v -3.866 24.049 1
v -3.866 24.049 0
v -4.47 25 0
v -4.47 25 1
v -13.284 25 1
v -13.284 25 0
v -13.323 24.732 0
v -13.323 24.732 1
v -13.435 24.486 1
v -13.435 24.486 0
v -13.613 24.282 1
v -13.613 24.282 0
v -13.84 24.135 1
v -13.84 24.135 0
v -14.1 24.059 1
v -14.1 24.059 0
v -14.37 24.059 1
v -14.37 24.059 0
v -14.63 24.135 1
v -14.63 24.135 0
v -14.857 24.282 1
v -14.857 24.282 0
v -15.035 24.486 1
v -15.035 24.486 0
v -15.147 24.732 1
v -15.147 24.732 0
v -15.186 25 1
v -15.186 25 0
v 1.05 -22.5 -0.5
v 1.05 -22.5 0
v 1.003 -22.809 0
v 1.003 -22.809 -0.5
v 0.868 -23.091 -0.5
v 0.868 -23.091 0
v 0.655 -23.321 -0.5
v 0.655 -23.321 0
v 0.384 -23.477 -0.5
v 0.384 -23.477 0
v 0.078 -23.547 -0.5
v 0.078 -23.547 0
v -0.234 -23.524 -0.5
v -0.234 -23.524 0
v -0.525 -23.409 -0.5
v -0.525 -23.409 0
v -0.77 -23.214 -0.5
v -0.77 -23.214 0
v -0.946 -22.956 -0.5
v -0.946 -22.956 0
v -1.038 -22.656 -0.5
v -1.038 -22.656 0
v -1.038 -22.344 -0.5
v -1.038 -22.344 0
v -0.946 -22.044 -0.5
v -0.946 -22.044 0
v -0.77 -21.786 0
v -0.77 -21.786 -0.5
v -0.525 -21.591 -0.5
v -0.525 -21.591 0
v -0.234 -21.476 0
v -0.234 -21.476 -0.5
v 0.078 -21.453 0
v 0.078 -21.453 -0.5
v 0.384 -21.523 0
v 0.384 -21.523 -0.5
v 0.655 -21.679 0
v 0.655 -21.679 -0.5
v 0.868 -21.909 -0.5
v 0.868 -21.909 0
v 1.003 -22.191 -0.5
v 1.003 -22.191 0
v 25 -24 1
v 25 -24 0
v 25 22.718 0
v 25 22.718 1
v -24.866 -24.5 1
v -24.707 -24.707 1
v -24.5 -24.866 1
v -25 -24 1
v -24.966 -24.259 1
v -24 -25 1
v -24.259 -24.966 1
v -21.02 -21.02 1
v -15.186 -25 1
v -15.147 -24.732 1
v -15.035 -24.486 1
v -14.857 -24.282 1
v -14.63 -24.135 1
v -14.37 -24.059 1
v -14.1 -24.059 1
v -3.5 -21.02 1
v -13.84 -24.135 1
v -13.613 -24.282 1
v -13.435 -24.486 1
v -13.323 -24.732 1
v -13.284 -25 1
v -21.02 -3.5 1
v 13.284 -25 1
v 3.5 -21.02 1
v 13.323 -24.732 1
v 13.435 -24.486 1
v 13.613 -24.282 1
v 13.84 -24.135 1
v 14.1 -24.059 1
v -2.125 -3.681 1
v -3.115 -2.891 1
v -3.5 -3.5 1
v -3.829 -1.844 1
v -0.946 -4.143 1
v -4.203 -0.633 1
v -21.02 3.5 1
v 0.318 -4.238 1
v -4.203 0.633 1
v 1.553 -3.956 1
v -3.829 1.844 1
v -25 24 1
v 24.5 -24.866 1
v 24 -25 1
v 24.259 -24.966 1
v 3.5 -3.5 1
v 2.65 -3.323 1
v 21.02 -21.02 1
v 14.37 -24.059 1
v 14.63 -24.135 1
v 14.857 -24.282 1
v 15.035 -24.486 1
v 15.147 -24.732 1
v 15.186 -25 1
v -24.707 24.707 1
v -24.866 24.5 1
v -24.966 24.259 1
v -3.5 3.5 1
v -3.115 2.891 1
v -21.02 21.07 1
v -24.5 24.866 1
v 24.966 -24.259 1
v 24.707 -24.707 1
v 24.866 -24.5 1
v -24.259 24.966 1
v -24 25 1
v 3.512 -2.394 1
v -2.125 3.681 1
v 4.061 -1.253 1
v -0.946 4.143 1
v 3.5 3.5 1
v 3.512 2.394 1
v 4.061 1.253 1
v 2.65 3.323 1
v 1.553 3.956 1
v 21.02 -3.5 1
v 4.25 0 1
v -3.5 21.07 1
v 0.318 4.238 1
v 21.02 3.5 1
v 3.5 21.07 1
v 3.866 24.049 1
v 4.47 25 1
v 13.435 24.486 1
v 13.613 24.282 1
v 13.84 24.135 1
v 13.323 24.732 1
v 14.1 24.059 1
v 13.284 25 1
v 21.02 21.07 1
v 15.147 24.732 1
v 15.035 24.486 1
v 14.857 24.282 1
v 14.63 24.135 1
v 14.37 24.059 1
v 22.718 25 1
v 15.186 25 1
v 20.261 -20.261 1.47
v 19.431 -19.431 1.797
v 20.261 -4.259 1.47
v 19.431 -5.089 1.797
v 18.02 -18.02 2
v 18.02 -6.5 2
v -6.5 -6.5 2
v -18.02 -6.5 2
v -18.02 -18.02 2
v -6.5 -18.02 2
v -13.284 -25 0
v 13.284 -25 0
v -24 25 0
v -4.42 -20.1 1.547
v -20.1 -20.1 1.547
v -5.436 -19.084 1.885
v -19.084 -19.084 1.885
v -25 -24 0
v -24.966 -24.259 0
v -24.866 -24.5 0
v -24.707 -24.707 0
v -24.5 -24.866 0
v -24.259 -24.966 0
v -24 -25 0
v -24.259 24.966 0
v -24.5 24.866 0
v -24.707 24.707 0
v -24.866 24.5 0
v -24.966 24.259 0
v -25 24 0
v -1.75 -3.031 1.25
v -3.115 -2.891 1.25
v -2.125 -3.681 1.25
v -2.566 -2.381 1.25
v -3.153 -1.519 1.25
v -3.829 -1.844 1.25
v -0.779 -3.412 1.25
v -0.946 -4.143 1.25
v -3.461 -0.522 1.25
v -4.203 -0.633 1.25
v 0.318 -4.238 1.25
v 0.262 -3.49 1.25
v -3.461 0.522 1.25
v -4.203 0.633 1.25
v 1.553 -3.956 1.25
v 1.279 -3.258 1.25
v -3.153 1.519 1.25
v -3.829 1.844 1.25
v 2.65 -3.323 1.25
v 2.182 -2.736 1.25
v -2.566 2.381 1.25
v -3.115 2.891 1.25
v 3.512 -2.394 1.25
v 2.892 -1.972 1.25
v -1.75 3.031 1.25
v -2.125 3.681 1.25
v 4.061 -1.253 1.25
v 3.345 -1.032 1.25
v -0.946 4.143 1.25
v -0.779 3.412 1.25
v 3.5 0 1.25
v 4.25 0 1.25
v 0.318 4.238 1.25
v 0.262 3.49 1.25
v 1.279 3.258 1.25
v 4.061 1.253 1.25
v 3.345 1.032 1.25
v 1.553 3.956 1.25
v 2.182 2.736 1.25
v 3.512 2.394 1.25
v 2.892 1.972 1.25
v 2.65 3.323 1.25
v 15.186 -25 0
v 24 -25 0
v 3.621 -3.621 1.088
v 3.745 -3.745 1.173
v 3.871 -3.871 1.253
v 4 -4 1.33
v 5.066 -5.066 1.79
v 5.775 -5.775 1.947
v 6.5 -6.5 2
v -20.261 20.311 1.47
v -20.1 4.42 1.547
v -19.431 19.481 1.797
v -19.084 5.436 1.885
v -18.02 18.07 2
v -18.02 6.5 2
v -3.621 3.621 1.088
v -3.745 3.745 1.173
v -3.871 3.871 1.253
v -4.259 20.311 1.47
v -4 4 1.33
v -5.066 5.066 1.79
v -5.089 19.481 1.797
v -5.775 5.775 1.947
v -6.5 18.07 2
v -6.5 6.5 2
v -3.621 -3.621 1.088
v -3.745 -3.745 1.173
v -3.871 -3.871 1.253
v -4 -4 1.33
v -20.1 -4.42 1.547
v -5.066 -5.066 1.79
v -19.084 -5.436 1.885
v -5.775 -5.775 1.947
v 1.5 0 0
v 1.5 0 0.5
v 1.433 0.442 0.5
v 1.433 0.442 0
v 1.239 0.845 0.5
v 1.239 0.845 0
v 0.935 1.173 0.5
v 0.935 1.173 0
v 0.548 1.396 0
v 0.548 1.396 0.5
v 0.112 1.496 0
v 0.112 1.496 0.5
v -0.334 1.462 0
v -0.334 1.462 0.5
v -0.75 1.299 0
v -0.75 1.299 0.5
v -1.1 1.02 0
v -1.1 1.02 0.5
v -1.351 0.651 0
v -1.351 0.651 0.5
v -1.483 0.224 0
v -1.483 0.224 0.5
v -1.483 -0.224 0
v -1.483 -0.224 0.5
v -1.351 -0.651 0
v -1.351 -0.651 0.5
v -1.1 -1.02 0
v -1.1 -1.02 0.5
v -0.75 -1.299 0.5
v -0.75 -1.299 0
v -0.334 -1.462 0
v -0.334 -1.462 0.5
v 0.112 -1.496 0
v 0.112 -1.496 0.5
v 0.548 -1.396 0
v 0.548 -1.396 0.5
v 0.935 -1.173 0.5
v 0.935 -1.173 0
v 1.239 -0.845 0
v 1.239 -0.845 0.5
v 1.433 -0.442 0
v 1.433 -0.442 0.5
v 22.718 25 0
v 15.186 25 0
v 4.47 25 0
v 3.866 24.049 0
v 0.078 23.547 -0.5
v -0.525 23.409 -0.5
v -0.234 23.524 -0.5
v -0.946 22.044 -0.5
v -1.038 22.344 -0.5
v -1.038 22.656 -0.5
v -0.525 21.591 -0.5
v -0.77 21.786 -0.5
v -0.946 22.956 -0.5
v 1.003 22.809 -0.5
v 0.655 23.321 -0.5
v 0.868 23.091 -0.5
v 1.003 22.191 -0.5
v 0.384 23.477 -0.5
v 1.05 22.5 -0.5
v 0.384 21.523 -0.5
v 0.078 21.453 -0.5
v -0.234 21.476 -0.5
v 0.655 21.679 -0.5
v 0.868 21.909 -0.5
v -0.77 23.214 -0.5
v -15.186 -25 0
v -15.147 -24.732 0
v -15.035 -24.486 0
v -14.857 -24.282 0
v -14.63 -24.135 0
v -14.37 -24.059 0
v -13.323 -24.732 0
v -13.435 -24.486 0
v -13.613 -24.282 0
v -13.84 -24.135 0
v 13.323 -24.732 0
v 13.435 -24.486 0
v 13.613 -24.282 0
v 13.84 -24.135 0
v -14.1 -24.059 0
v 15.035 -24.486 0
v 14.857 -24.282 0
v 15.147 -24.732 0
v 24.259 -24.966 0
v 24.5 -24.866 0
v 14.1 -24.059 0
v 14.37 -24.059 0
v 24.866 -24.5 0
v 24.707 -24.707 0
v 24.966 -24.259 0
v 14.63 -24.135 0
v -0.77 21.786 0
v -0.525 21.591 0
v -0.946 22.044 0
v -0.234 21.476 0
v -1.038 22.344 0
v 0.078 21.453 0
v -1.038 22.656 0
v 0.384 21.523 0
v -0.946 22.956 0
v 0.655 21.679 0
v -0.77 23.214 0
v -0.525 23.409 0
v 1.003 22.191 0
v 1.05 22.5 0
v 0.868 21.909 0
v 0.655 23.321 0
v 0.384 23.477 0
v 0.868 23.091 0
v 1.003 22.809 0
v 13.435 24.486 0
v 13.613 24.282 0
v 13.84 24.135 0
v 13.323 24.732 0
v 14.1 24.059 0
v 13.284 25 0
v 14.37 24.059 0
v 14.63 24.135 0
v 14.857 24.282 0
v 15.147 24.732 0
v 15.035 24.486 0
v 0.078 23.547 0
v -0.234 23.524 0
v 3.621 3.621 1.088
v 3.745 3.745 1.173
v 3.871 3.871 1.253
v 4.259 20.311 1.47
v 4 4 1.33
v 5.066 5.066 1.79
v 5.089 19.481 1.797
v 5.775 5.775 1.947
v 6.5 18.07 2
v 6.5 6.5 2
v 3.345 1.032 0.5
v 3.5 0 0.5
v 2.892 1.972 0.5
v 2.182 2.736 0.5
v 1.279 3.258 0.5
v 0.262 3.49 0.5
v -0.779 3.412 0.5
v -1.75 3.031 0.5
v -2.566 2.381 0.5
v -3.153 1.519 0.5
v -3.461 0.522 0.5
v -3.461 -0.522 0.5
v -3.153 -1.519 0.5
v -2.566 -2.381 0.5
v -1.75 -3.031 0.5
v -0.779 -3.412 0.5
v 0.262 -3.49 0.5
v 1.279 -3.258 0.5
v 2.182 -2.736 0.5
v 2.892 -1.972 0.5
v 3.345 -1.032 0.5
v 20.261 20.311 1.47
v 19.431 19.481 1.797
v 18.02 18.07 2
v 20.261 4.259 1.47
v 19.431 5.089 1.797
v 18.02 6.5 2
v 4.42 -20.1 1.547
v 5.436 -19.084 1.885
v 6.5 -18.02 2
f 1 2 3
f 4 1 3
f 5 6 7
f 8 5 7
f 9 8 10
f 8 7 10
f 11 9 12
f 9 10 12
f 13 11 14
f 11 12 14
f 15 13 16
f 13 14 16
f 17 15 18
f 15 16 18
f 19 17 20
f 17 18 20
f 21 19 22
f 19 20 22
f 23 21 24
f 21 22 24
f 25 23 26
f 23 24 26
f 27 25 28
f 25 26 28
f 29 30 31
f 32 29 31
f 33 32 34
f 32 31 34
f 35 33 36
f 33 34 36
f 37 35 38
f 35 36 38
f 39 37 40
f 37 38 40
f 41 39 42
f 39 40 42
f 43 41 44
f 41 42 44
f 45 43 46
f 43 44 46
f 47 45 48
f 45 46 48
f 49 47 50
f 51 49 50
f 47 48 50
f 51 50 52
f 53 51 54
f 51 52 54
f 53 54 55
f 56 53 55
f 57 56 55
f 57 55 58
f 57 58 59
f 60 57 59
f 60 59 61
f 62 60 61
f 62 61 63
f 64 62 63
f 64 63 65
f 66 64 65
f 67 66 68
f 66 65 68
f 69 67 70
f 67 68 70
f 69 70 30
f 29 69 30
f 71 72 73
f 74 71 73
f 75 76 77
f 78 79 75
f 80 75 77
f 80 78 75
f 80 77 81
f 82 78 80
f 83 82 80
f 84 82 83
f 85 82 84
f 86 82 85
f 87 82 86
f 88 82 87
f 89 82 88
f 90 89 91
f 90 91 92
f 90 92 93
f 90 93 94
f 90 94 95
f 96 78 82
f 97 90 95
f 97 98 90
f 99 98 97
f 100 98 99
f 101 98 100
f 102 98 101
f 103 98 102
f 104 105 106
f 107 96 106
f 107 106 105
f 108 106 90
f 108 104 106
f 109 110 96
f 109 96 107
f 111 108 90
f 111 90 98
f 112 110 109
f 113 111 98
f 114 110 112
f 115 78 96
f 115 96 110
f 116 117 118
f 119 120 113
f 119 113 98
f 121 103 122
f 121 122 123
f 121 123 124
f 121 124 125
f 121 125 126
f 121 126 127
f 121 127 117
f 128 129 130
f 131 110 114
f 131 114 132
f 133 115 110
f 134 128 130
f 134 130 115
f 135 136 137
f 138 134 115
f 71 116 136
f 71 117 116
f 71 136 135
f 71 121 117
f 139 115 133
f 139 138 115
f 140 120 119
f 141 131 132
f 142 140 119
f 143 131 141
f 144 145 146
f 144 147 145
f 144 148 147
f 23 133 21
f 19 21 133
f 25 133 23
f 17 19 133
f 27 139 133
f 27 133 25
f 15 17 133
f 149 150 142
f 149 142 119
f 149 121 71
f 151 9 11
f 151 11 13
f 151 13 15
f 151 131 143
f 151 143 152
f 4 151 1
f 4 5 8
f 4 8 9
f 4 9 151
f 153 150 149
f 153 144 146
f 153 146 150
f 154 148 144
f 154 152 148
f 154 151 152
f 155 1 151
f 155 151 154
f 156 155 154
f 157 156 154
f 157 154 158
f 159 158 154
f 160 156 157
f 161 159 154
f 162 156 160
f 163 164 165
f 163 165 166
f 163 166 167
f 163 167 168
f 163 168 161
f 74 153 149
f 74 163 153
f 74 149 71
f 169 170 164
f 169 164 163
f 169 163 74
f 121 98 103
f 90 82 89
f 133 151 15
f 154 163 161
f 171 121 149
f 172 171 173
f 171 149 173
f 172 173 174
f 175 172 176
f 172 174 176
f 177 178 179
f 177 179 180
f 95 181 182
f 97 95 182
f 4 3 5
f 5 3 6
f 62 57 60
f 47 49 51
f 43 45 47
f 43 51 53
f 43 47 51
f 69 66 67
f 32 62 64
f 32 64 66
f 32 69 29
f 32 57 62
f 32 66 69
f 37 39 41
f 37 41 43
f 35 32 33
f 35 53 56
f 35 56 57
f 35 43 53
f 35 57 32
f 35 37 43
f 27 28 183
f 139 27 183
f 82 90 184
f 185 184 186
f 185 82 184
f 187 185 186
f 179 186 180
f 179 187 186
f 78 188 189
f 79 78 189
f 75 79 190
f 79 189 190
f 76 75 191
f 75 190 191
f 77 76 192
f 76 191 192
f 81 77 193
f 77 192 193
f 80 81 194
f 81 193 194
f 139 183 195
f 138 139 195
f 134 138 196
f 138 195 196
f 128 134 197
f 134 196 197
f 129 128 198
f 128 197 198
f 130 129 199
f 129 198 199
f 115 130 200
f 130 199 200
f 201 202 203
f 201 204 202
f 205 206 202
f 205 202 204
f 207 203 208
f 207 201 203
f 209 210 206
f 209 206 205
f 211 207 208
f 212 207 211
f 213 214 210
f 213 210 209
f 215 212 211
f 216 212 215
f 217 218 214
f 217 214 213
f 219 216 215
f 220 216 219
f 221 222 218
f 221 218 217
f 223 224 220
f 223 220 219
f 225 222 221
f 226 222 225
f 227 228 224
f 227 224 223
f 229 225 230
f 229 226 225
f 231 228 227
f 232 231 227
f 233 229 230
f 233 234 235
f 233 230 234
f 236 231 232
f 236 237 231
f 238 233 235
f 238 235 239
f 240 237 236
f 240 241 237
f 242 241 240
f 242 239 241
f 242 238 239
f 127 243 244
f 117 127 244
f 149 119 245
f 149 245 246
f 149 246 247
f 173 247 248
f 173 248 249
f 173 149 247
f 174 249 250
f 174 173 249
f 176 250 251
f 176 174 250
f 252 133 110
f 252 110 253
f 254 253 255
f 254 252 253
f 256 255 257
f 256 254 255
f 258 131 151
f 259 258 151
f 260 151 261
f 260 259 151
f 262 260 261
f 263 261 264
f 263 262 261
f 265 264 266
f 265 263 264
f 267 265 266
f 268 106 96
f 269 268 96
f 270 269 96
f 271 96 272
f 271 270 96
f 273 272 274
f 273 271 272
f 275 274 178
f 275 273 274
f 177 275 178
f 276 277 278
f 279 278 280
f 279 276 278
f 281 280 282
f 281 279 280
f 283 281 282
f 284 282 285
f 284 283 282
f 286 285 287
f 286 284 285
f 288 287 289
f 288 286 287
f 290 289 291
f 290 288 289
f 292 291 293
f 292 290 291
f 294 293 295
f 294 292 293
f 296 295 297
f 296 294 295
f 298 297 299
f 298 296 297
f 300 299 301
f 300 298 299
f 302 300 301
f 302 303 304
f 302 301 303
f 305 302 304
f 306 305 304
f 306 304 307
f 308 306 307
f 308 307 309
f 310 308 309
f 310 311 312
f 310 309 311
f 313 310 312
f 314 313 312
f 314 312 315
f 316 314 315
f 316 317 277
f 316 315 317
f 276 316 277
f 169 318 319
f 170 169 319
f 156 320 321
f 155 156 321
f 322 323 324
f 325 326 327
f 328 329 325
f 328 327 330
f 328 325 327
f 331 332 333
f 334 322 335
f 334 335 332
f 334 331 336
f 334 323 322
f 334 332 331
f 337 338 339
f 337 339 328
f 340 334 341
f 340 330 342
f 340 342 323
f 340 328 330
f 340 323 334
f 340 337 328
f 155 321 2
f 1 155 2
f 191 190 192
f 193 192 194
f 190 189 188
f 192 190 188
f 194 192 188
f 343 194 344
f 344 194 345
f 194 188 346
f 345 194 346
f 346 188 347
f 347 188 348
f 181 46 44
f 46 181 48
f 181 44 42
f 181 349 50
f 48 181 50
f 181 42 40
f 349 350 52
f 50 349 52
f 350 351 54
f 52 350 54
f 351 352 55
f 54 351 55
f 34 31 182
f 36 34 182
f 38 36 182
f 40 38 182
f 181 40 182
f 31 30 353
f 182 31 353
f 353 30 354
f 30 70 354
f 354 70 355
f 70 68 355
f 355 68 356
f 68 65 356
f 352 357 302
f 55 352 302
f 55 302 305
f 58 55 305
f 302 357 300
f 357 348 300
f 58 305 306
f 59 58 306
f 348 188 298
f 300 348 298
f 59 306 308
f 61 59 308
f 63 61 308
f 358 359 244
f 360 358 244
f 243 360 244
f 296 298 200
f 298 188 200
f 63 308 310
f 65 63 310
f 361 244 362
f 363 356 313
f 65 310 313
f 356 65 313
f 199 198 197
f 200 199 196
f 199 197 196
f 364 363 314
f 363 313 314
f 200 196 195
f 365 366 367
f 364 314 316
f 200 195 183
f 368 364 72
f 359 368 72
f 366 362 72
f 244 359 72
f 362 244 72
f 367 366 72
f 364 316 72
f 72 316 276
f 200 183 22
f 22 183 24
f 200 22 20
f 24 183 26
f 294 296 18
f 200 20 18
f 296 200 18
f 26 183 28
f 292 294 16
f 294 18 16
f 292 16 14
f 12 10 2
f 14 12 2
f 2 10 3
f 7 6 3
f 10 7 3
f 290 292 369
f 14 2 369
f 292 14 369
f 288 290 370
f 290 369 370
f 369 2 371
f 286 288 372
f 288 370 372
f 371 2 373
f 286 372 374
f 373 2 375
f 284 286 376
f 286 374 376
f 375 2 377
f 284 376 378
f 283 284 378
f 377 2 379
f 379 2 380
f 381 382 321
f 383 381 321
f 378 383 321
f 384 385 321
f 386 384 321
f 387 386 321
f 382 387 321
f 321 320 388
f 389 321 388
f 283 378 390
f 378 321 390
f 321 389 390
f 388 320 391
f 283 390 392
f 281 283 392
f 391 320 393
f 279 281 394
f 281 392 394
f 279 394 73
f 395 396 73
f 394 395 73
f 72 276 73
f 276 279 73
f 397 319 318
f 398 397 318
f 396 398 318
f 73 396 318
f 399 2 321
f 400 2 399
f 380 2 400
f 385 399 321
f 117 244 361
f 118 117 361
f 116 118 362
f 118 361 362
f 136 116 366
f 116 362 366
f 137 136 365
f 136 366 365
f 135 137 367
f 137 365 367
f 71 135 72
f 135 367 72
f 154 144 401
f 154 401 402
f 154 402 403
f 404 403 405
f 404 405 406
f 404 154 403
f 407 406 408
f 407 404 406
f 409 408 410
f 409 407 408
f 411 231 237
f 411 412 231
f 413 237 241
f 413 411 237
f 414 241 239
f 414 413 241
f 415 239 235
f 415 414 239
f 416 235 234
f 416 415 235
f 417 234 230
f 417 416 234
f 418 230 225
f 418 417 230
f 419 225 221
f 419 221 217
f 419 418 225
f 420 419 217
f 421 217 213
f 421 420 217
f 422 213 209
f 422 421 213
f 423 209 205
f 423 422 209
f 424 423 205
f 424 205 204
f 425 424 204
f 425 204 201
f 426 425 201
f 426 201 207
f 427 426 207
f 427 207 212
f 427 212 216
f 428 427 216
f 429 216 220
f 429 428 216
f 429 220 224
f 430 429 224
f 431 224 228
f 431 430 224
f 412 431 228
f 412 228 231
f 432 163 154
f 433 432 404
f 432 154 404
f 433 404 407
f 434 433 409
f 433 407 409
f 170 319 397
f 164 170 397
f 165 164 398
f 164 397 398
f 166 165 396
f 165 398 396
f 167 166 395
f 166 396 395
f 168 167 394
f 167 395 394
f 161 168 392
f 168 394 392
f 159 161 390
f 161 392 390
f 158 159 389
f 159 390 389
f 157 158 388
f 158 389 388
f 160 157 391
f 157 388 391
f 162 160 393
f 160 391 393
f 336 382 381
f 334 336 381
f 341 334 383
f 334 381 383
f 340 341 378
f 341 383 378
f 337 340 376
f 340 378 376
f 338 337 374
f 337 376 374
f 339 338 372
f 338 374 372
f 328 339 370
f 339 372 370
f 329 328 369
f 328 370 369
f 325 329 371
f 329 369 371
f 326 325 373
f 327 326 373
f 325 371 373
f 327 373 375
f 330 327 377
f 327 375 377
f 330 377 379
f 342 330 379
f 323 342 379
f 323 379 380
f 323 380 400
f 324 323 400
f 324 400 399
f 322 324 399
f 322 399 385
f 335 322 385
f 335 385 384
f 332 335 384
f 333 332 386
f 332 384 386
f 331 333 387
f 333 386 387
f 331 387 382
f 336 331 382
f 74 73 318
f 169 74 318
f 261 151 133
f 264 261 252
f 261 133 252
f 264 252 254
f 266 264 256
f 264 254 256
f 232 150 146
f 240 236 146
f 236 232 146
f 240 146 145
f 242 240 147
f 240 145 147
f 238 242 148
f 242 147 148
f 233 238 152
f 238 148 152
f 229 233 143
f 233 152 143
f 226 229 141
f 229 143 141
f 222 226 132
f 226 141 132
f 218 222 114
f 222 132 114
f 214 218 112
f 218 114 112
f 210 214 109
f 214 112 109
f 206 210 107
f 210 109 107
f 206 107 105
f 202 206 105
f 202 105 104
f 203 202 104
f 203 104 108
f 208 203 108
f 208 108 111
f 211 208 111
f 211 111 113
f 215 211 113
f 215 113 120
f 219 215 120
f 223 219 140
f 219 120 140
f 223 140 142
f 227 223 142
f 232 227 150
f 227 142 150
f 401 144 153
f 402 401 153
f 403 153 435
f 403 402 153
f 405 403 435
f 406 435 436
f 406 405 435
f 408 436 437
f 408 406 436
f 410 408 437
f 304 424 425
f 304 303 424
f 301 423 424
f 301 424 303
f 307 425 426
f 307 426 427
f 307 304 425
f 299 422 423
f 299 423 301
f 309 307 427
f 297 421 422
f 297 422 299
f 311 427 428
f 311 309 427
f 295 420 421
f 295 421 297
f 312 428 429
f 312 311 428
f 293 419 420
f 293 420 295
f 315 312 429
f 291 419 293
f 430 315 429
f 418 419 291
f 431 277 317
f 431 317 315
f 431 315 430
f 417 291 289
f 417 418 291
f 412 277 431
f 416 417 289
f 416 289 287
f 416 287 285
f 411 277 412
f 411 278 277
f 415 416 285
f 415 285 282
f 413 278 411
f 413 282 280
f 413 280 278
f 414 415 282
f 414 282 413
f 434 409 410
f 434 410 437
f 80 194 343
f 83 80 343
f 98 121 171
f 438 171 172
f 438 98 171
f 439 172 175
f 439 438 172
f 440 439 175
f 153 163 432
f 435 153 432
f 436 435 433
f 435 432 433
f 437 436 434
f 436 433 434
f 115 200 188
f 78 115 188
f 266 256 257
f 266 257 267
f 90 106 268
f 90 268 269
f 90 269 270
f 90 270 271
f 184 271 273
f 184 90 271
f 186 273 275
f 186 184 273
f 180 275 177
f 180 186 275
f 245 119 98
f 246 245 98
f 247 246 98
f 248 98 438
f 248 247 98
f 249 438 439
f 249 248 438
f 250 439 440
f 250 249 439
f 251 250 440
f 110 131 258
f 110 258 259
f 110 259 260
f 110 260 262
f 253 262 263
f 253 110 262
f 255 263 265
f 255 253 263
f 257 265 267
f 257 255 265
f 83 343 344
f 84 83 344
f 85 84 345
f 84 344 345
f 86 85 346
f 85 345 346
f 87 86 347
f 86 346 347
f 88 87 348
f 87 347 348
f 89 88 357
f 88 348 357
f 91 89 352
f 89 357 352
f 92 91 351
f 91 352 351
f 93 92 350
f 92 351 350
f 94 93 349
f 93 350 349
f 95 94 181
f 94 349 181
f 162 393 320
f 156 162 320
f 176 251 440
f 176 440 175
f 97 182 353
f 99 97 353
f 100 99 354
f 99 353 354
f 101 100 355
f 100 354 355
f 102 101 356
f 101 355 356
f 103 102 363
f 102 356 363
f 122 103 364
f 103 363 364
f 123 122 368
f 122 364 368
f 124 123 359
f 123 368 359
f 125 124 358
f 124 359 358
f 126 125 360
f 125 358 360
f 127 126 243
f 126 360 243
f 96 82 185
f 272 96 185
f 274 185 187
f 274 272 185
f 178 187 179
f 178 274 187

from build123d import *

# Parameters (mm, degrees)
F0_W         = 17.52
F0_H         = 17.52
F0_H_2       = 17.57
F0_R         = 1.5
F1_DEPTH     = 1
F2_W         = 17.52
F2_H         = 17.57
F2_H_2       = 17.52
F3_DEPTH     = 1
F4_R         = 3.5
F5_DEPTH     = 0.5
F6_R         = 4.25
F6_R_2       = 3.5
F7_DEPTH     = 0.25
F8_T1_DEPTH  = 32.52
F8_T3_DEPTH  = 32.52
F8_T5_DEPTH  = 32.57
F8_T7_DEPTH  = 32.52
F8_T12_DEPTH = 32.52
F8_S13_R     = 4.25
F8_T14_DEPTH = 18
F8_T18_DEPTH = 32.52
F8_S19_R     = 4.25
F8_T20_DEPTH = 18
F8_T24_DEPTH = 32.52
F8_S25_R     = 4.25
F8_T26_DEPTH = 18
F8_T30_DEPTH = 32.57
F8_S31_R     = 4.25
F8_T32_DEPTH = 18
F8_T36_DEPTH = 32.57
F8_S37_R     = 4.25
F8_T38_DEPTH = 18
F8_T42_DEPTH = 32.52
F8_S43_R     = 4.25
F8_T44_DEPTH = 18
F8_T48_DEPTH = 32.52
F8_S49_R     = 4.25
F8_T50_DEPTH = 18
F8_T54_DEPTH = 32.52
F8_S55_R     = 4.25
F8_T56_DEPTH = 18
F9_R         = 1.05
F10_DEPTH    = 0.5


# Not quite as in the source:
# - a fillet or chamfer that OpenCascade refuses, or shapes differently, is made with other operations: its cross-section is extruded or revolved along the edge and cut away or added


with BuildPart() as f1:
    # F0 (on Top) → F1 (new body)
    with BuildSketch(Plane.XY):
        with BuildLine():
            ThreePointArc((-25, -24), (-24.7071067812, -24.7071067812), (-24, -25))
            Line((-24, -25), (-15.1855654437, -25))
            ThreePointArc((-15.1855654437, -25), (-14.2350281943, -24.0494627506), (-13.2844909448, -25))
            Line((-13.2844909448, -25), (13.2844909448, -25))
            ThreePointArc((13.2844909448, -25), (14.2350281943, -24.0494627506), (15.1855654437, -25))
            Line((15.1855654437, -25), (24, -25))
            ThreePointArc((24, -25), (24.7071067812, -24.7071067812), (25, -24))
            Line((25, -24), (25, 22.7180756629))
            Line((25, 22.7180756629), (22.7180756629, 25))
            Line((22.7180756629, 25), (15.1855654437, 25))
            ThreePointArc((15.1855654437, 25), (14.2350281943, 24.0494627506), (13.2844909448, 25))
            Line((13.2844909448, 25), (4.4700563885, 25))
            Line((4.4700563885, 25), (3.8659917191, 24.0494627506))
            Line((3.8659917191, 24.0494627506), (0, 24.0494627506))
            Line((0, 24.0494627506), (-3.8659917191, 24.0494627506))
            Line((-3.8659917191, 24.0494627506), (-4.4700563885, 25))
            Line((-4.4700563885, 25), (-13.2844909448, 25))
            ThreePointArc((-13.2844909448, 25), (-14.2350281943, 24.0494627506), (-15.1855654437, 25))
            Line((-15.1855654437, 25), (-24, 25))
            ThreePointArc((-24, 25), (-24.7071067812, 24.7071067812), (-25, 24))
            Line((-25, 24), (-25, -24))
        make_face()
        with Locations((-12.26, -12.26)):
            Rectangle(F0_W, F0_H, mode=Mode.SUBTRACT)
        with Locations((12.26, -12.26)):
            Rectangle(F0_W, F0_H, mode=Mode.SUBTRACT)
        with Locations((-12.26, 12.285)):
            Rectangle(F0_W, F0_H_2, mode=Mode.SUBTRACT)
        Circle(F0_R, mode=Mode.SUBTRACT)
        with Locations((12.26, 12.285)):
            Rectangle(F0_W, F0_H_2, mode=Mode.SUBTRACT)
    extrude(amount=F1_DEPTH)

    # F2 (on face) → F3 (join, symmetric)
    with BuildSketch(Plane.XY.offset(1)):
        with Locations((-12.26, 12.285)):
            Rectangle(F2_W, F2_H)
        with Locations((12.26, 12.285)):
            Rectangle(F2_W, F2_H)
        with Locations((12.26, -12.26)):
            Rectangle(F2_W, F2_H_2)
        with Locations((-12.26, -12.26)):
            Rectangle(F2_W, F2_H_2)
    extrude(amount=F3_DEPTH, both=True)

    # F4 (on face) → F5 (cut)
    with BuildSketch(Plane.XY.offset(1)):
        Circle(F4_R)
    extrude(amount=-F5_DEPTH, mode=Mode.SUBTRACT)

    # F6 (on face) → F7 (join)
    with BuildSketch(Plane.XY.offset(1)):
        Circle(F6_R)
        Circle(F6_R_2, mode=Mode.SUBTRACT)
    extrude(amount=F7_DEPTH)

    # F8: fillet of radius 5 on 16 edges, made by hand

    # F8_s2 → F8_t1 (cut)
    with BuildSketch(Plane.YZ.offset(-28.52)):
        with BuildLine():
            ThreePointArc((-21.02, 1), (-19.6011388301, 1.7434164903), (-18.02, 2))
            Line((-18.02, 2), (-21.02, 2))
            Line((-21.02, 2), (-21.02, 1))
        make_face()
        with BuildLine():
            ThreePointArc((21.07, 1), (19.6511388301, 1.7434164903), (18.07, 2))
            Line((18.07, 2), (21.07, 2))
            Line((21.07, 2), (21.07, 1))
        make_face()
    extrude(amount=F8_T1_DEPTH, mode=Mode.SUBTRACT)

    # F8_s4 → F8_t3 (cut)
    with BuildSketch(Plane.XZ.offset(-4)):
        with BuildLine():
            ThreePointArc((-21.02, 1), (-19.6011388301, 1.7434164903), (-18.02, 2))
            Line((-18.02, 2), (-21.02, 2))
            Line((-21.02, 2), (-21.02, 1))
        make_face()
        with BuildLine():
            ThreePointArc((21.02, 1), (19.6011388301, 1.7434164903), (18.02, 2))
            Line((18.02, 2), (21.02, 2))
            Line((21.02, 2), (21.02, 1))
        make_face()
    extrude(amount=F8_T3_DEPTH, mode=Mode.SUBTRACT)

    # F8_s6 → F8_t5 (cut)
    with BuildSketch(Plane.XZ.offset(-28.57)):
        with BuildLine():
            ThreePointArc((-21.02, 1), (-19.6011388301, 1.7434164903), (-18.02, 2))
            Line((-18.02, 2), (-21.02, 2))
            Line((-21.02, 2), (-21.02, 1))
        make_face()
        with BuildLine():
            ThreePointArc((21.02, 1), (19.6011388301, 1.7434164903), (18.02, 2))
            Line((18.02, 2), (21.02, 2))
            Line((21.02, 2), (21.02, 1))
        make_face()
    extrude(amount=F8_T5_DEPTH, mode=Mode.SUBTRACT)

    # F8_s8 → F8_t7 (cut)
    with BuildSketch(Plane.YZ.offset(-4)):
        with BuildLine():
            ThreePointArc((21.07, 1), (19.6511388301, 1.7434164903), (18.07, 2))
            Line((18.07, 2), (21.07, 2))
            Line((21.07, 2), (21.07, 1))
        make_face()
        with BuildLine():
            ThreePointArc((-21.02, 1), (-19.6011388301, 1.7434164903), (-18.02, 2))
            Line((-18.02, 2), (-21.02, 2))
            Line((-21.02, 2), (-21.02, 1))
        make_face()
    extrude(amount=F8_T7_DEPTH, mode=Mode.SUBTRACT)


with BuildPart() as f8_tool10:
    # F8_s11 → F8_t12 (new body)
    with BuildSketch(Plane.XZ.offset(28.52)):
        with BuildLine():
            ThreePointArc((-3.5, 1), (-4.9188611699, 1.7434164903), (-6.5, 2))
            Line((-6.5, 2), (-3.5, 2))
            Line((-3.5, 2), (-3.5, 1))
        make_face()
    extrude(amount=-F8_T12_DEPTH)

    # F8_s13 → F8_t14 (cut, symmetric)
    with BuildSketch(Plane.XY.offset(1.5)):
        Circle(F8_S13_R)
    extrude(amount=F8_T14_DEPTH, both=True, mode=Mode.SUBTRACT)


with BuildPart() as f1_1:
    add(f1.part)

    # F8_t9: cut F8_tool10
    add(f8_tool10.part, mode=Mode.SUBTRACT)


with BuildPart() as f8_tool16:
    # F8_s17 → F8_t18 (new body)
    with BuildSketch(Plane.YZ.offset(4)):
        with BuildLine():
            ThreePointArc((-3.5, 1), (-4.9188611699, 1.7434164903), (-6.5, 2))
            Line((-6.5, 2), (-3.5, 2))
            Line((-3.5, 2), (-3.5, 1))
        make_face()
    extrude(amount=-F8_T18_DEPTH)

    # F8_s19 → F8_t20 (cut, symmetric)
    with BuildSketch(Plane.XY.offset(1.5)):
        Circle(F8_S19_R)
    extrude(amount=F8_T20_DEPTH, both=True, mode=Mode.SUBTRACT)


with BuildPart() as f1_2:
    add(f1_1.part)

    # F8_t15: cut F8_tool16
    add(f8_tool16.part, mode=Mode.SUBTRACT)


with BuildPart() as f8_tool22:
    # F8_s23 → F8_t24 (new body)
    with BuildSketch(Plane.YZ.offset(-28.52)):
        with BuildLine():
            ThreePointArc((3.5, 1), (4.9188611699, 1.7434164903), (6.5, 2))
            Line((6.5, 2), (3.5, 2))
            Line((3.5, 2), (3.5, 1))
        make_face()
    extrude(amount=F8_T24_DEPTH)

    # F8_s25 → F8_t26 (cut, symmetric)
    with BuildSketch(Plane.XY.offset(1.5)):
        Circle(F8_S25_R)
    extrude(amount=F8_T26_DEPTH, both=True, mode=Mode.SUBTRACT)


with BuildPart() as f1_3:
    add(f1_2.part)

    # F8_t21: cut F8_tool22
    add(f8_tool22.part, mode=Mode.SUBTRACT)


with BuildPart() as f8_tool28:
    # F8_s29 → F8_t30 (new body)
    with BuildSketch(Plane.XZ.offset(4)):
        with BuildLine():
            ThreePointArc((-3.5, 1), (-4.9188611699, 1.7434164903), (-6.5, 2))
            Line((-6.5, 2), (-3.5, 2))
            Line((-3.5, 2), (-3.5, 1))
        make_face()
    extrude(amount=-F8_T30_DEPTH)

    # F8_s31 → F8_t32 (cut, symmetric)
    with BuildSketch(Plane.XY.offset(1.5)):
        Circle(F8_S31_R)
    extrude(amount=F8_T32_DEPTH, both=True, mode=Mode.SUBTRACT)


with BuildPart() as f1_4:
    add(f1_3.part)

    # F8_t27: cut F8_tool28
    add(f8_tool28.part, mode=Mode.SUBTRACT)


with BuildPart() as f8_tool34:
    # F8_s35 → F8_t36 (new body)
    with BuildSketch(Plane.XZ.offset(-28.57)):
        with BuildLine():
            ThreePointArc((3.5, 1), (4.9188611699, 1.7434164903), (6.5, 2))
            Line((6.5, 2), (3.5, 2))
            Line((3.5, 2), (3.5, 1))
        make_face()
    extrude(amount=F8_T36_DEPTH)

    # F8_s37 → F8_t38 (cut, symmetric)
    with BuildSketch(Plane.XY.offset(1.5)):
        Circle(F8_S37_R)
    extrude(amount=F8_T38_DEPTH, both=True, mode=Mode.SUBTRACT)


with BuildPart() as f1_5:
    add(f1_4.part)

    # F8_t33: cut F8_tool34
    add(f8_tool34.part, mode=Mode.SUBTRACT)


with BuildPart() as f8_tool40:
    # F8_s41 → F8_t42 (new body)
    with BuildSketch(Plane.YZ.offset(-4)):
        with BuildLine():
            ThreePointArc((3.5, 1), (4.9188611699, 1.7434164903), (6.5, 2))
            Line((6.5, 2), (3.5, 2))
            Line((3.5, 2), (3.5, 1))
        make_face()
    extrude(amount=F8_T42_DEPTH)

    # F8_s43 → F8_t44 (cut, symmetric)
    with BuildSketch(Plane.XY.offset(1.5)):
        Circle(F8_S43_R)
    extrude(amount=F8_T44_DEPTH, both=True, mode=Mode.SUBTRACT)


with BuildPart() as f1_6:
    add(f1_5.part)

    # F8_t39: cut F8_tool40
    add(f8_tool40.part, mode=Mode.SUBTRACT)


with BuildPart() as f8_tool46:
    # F8_s47 → F8_t48 (new body)
    with BuildSketch(Plane.YZ.offset(28.52)):
        with BuildLine():
            ThreePointArc((-3.5, 1), (-4.9188611699, 1.7434164903), (-6.5, 2))
            Line((-6.5, 2), (-3.5, 2))
            Line((-3.5, 2), (-3.5, 1))
        make_face()
    extrude(amount=-F8_T48_DEPTH)

    # F8_s49 → F8_t50 (cut, symmetric)
    with BuildSketch(Plane.XY.offset(1.5)):
        Circle(F8_S49_R)
    extrude(amount=F8_T50_DEPTH, both=True, mode=Mode.SUBTRACT)


with BuildPart() as f1_7:
    add(f1_6.part)

    # F8_t45: cut F8_tool46
    add(f8_tool46.part, mode=Mode.SUBTRACT)


with BuildPart() as f8_tool52:
    # F8_s53 → F8_t54 (new body)
    with BuildSketch(Plane.XZ.offset(-4)):
        with BuildLine():
            ThreePointArc((3.5, 1), (4.9188611699, 1.7434164903), (6.5, 2))
            Line((6.5, 2), (3.5, 2))
            Line((3.5, 2), (3.5, 1))
        make_face()
    extrude(amount=F8_T54_DEPTH)

    # F8_s55 → F8_t56 (cut, symmetric)
    with BuildSketch(Plane.XY.offset(1.5)):
        Circle(F8_S55_R)
    extrude(amount=F8_T56_DEPTH, both=True, mode=Mode.SUBTRACT)


with BuildPart() as f1_8:
    add(f1_7.part)

    # F8_t51: cut F8_tool52
    add(f8_tool52.part, mode=Mode.SUBTRACT)

    # F9 (on face) → F10 (join)
    with BuildSketch(Plane(origin=(0, 0, 0), x_dir=(1, 0, 0), z_dir=(0, 0, -1))):
        with Locations((0, 22.5)):
            Circle(F9_R)
        with Locations((0, -22.5)):
            Circle(F9_R)
    extrude(amount=F10_DEPTH)


solid = f1_8.part
